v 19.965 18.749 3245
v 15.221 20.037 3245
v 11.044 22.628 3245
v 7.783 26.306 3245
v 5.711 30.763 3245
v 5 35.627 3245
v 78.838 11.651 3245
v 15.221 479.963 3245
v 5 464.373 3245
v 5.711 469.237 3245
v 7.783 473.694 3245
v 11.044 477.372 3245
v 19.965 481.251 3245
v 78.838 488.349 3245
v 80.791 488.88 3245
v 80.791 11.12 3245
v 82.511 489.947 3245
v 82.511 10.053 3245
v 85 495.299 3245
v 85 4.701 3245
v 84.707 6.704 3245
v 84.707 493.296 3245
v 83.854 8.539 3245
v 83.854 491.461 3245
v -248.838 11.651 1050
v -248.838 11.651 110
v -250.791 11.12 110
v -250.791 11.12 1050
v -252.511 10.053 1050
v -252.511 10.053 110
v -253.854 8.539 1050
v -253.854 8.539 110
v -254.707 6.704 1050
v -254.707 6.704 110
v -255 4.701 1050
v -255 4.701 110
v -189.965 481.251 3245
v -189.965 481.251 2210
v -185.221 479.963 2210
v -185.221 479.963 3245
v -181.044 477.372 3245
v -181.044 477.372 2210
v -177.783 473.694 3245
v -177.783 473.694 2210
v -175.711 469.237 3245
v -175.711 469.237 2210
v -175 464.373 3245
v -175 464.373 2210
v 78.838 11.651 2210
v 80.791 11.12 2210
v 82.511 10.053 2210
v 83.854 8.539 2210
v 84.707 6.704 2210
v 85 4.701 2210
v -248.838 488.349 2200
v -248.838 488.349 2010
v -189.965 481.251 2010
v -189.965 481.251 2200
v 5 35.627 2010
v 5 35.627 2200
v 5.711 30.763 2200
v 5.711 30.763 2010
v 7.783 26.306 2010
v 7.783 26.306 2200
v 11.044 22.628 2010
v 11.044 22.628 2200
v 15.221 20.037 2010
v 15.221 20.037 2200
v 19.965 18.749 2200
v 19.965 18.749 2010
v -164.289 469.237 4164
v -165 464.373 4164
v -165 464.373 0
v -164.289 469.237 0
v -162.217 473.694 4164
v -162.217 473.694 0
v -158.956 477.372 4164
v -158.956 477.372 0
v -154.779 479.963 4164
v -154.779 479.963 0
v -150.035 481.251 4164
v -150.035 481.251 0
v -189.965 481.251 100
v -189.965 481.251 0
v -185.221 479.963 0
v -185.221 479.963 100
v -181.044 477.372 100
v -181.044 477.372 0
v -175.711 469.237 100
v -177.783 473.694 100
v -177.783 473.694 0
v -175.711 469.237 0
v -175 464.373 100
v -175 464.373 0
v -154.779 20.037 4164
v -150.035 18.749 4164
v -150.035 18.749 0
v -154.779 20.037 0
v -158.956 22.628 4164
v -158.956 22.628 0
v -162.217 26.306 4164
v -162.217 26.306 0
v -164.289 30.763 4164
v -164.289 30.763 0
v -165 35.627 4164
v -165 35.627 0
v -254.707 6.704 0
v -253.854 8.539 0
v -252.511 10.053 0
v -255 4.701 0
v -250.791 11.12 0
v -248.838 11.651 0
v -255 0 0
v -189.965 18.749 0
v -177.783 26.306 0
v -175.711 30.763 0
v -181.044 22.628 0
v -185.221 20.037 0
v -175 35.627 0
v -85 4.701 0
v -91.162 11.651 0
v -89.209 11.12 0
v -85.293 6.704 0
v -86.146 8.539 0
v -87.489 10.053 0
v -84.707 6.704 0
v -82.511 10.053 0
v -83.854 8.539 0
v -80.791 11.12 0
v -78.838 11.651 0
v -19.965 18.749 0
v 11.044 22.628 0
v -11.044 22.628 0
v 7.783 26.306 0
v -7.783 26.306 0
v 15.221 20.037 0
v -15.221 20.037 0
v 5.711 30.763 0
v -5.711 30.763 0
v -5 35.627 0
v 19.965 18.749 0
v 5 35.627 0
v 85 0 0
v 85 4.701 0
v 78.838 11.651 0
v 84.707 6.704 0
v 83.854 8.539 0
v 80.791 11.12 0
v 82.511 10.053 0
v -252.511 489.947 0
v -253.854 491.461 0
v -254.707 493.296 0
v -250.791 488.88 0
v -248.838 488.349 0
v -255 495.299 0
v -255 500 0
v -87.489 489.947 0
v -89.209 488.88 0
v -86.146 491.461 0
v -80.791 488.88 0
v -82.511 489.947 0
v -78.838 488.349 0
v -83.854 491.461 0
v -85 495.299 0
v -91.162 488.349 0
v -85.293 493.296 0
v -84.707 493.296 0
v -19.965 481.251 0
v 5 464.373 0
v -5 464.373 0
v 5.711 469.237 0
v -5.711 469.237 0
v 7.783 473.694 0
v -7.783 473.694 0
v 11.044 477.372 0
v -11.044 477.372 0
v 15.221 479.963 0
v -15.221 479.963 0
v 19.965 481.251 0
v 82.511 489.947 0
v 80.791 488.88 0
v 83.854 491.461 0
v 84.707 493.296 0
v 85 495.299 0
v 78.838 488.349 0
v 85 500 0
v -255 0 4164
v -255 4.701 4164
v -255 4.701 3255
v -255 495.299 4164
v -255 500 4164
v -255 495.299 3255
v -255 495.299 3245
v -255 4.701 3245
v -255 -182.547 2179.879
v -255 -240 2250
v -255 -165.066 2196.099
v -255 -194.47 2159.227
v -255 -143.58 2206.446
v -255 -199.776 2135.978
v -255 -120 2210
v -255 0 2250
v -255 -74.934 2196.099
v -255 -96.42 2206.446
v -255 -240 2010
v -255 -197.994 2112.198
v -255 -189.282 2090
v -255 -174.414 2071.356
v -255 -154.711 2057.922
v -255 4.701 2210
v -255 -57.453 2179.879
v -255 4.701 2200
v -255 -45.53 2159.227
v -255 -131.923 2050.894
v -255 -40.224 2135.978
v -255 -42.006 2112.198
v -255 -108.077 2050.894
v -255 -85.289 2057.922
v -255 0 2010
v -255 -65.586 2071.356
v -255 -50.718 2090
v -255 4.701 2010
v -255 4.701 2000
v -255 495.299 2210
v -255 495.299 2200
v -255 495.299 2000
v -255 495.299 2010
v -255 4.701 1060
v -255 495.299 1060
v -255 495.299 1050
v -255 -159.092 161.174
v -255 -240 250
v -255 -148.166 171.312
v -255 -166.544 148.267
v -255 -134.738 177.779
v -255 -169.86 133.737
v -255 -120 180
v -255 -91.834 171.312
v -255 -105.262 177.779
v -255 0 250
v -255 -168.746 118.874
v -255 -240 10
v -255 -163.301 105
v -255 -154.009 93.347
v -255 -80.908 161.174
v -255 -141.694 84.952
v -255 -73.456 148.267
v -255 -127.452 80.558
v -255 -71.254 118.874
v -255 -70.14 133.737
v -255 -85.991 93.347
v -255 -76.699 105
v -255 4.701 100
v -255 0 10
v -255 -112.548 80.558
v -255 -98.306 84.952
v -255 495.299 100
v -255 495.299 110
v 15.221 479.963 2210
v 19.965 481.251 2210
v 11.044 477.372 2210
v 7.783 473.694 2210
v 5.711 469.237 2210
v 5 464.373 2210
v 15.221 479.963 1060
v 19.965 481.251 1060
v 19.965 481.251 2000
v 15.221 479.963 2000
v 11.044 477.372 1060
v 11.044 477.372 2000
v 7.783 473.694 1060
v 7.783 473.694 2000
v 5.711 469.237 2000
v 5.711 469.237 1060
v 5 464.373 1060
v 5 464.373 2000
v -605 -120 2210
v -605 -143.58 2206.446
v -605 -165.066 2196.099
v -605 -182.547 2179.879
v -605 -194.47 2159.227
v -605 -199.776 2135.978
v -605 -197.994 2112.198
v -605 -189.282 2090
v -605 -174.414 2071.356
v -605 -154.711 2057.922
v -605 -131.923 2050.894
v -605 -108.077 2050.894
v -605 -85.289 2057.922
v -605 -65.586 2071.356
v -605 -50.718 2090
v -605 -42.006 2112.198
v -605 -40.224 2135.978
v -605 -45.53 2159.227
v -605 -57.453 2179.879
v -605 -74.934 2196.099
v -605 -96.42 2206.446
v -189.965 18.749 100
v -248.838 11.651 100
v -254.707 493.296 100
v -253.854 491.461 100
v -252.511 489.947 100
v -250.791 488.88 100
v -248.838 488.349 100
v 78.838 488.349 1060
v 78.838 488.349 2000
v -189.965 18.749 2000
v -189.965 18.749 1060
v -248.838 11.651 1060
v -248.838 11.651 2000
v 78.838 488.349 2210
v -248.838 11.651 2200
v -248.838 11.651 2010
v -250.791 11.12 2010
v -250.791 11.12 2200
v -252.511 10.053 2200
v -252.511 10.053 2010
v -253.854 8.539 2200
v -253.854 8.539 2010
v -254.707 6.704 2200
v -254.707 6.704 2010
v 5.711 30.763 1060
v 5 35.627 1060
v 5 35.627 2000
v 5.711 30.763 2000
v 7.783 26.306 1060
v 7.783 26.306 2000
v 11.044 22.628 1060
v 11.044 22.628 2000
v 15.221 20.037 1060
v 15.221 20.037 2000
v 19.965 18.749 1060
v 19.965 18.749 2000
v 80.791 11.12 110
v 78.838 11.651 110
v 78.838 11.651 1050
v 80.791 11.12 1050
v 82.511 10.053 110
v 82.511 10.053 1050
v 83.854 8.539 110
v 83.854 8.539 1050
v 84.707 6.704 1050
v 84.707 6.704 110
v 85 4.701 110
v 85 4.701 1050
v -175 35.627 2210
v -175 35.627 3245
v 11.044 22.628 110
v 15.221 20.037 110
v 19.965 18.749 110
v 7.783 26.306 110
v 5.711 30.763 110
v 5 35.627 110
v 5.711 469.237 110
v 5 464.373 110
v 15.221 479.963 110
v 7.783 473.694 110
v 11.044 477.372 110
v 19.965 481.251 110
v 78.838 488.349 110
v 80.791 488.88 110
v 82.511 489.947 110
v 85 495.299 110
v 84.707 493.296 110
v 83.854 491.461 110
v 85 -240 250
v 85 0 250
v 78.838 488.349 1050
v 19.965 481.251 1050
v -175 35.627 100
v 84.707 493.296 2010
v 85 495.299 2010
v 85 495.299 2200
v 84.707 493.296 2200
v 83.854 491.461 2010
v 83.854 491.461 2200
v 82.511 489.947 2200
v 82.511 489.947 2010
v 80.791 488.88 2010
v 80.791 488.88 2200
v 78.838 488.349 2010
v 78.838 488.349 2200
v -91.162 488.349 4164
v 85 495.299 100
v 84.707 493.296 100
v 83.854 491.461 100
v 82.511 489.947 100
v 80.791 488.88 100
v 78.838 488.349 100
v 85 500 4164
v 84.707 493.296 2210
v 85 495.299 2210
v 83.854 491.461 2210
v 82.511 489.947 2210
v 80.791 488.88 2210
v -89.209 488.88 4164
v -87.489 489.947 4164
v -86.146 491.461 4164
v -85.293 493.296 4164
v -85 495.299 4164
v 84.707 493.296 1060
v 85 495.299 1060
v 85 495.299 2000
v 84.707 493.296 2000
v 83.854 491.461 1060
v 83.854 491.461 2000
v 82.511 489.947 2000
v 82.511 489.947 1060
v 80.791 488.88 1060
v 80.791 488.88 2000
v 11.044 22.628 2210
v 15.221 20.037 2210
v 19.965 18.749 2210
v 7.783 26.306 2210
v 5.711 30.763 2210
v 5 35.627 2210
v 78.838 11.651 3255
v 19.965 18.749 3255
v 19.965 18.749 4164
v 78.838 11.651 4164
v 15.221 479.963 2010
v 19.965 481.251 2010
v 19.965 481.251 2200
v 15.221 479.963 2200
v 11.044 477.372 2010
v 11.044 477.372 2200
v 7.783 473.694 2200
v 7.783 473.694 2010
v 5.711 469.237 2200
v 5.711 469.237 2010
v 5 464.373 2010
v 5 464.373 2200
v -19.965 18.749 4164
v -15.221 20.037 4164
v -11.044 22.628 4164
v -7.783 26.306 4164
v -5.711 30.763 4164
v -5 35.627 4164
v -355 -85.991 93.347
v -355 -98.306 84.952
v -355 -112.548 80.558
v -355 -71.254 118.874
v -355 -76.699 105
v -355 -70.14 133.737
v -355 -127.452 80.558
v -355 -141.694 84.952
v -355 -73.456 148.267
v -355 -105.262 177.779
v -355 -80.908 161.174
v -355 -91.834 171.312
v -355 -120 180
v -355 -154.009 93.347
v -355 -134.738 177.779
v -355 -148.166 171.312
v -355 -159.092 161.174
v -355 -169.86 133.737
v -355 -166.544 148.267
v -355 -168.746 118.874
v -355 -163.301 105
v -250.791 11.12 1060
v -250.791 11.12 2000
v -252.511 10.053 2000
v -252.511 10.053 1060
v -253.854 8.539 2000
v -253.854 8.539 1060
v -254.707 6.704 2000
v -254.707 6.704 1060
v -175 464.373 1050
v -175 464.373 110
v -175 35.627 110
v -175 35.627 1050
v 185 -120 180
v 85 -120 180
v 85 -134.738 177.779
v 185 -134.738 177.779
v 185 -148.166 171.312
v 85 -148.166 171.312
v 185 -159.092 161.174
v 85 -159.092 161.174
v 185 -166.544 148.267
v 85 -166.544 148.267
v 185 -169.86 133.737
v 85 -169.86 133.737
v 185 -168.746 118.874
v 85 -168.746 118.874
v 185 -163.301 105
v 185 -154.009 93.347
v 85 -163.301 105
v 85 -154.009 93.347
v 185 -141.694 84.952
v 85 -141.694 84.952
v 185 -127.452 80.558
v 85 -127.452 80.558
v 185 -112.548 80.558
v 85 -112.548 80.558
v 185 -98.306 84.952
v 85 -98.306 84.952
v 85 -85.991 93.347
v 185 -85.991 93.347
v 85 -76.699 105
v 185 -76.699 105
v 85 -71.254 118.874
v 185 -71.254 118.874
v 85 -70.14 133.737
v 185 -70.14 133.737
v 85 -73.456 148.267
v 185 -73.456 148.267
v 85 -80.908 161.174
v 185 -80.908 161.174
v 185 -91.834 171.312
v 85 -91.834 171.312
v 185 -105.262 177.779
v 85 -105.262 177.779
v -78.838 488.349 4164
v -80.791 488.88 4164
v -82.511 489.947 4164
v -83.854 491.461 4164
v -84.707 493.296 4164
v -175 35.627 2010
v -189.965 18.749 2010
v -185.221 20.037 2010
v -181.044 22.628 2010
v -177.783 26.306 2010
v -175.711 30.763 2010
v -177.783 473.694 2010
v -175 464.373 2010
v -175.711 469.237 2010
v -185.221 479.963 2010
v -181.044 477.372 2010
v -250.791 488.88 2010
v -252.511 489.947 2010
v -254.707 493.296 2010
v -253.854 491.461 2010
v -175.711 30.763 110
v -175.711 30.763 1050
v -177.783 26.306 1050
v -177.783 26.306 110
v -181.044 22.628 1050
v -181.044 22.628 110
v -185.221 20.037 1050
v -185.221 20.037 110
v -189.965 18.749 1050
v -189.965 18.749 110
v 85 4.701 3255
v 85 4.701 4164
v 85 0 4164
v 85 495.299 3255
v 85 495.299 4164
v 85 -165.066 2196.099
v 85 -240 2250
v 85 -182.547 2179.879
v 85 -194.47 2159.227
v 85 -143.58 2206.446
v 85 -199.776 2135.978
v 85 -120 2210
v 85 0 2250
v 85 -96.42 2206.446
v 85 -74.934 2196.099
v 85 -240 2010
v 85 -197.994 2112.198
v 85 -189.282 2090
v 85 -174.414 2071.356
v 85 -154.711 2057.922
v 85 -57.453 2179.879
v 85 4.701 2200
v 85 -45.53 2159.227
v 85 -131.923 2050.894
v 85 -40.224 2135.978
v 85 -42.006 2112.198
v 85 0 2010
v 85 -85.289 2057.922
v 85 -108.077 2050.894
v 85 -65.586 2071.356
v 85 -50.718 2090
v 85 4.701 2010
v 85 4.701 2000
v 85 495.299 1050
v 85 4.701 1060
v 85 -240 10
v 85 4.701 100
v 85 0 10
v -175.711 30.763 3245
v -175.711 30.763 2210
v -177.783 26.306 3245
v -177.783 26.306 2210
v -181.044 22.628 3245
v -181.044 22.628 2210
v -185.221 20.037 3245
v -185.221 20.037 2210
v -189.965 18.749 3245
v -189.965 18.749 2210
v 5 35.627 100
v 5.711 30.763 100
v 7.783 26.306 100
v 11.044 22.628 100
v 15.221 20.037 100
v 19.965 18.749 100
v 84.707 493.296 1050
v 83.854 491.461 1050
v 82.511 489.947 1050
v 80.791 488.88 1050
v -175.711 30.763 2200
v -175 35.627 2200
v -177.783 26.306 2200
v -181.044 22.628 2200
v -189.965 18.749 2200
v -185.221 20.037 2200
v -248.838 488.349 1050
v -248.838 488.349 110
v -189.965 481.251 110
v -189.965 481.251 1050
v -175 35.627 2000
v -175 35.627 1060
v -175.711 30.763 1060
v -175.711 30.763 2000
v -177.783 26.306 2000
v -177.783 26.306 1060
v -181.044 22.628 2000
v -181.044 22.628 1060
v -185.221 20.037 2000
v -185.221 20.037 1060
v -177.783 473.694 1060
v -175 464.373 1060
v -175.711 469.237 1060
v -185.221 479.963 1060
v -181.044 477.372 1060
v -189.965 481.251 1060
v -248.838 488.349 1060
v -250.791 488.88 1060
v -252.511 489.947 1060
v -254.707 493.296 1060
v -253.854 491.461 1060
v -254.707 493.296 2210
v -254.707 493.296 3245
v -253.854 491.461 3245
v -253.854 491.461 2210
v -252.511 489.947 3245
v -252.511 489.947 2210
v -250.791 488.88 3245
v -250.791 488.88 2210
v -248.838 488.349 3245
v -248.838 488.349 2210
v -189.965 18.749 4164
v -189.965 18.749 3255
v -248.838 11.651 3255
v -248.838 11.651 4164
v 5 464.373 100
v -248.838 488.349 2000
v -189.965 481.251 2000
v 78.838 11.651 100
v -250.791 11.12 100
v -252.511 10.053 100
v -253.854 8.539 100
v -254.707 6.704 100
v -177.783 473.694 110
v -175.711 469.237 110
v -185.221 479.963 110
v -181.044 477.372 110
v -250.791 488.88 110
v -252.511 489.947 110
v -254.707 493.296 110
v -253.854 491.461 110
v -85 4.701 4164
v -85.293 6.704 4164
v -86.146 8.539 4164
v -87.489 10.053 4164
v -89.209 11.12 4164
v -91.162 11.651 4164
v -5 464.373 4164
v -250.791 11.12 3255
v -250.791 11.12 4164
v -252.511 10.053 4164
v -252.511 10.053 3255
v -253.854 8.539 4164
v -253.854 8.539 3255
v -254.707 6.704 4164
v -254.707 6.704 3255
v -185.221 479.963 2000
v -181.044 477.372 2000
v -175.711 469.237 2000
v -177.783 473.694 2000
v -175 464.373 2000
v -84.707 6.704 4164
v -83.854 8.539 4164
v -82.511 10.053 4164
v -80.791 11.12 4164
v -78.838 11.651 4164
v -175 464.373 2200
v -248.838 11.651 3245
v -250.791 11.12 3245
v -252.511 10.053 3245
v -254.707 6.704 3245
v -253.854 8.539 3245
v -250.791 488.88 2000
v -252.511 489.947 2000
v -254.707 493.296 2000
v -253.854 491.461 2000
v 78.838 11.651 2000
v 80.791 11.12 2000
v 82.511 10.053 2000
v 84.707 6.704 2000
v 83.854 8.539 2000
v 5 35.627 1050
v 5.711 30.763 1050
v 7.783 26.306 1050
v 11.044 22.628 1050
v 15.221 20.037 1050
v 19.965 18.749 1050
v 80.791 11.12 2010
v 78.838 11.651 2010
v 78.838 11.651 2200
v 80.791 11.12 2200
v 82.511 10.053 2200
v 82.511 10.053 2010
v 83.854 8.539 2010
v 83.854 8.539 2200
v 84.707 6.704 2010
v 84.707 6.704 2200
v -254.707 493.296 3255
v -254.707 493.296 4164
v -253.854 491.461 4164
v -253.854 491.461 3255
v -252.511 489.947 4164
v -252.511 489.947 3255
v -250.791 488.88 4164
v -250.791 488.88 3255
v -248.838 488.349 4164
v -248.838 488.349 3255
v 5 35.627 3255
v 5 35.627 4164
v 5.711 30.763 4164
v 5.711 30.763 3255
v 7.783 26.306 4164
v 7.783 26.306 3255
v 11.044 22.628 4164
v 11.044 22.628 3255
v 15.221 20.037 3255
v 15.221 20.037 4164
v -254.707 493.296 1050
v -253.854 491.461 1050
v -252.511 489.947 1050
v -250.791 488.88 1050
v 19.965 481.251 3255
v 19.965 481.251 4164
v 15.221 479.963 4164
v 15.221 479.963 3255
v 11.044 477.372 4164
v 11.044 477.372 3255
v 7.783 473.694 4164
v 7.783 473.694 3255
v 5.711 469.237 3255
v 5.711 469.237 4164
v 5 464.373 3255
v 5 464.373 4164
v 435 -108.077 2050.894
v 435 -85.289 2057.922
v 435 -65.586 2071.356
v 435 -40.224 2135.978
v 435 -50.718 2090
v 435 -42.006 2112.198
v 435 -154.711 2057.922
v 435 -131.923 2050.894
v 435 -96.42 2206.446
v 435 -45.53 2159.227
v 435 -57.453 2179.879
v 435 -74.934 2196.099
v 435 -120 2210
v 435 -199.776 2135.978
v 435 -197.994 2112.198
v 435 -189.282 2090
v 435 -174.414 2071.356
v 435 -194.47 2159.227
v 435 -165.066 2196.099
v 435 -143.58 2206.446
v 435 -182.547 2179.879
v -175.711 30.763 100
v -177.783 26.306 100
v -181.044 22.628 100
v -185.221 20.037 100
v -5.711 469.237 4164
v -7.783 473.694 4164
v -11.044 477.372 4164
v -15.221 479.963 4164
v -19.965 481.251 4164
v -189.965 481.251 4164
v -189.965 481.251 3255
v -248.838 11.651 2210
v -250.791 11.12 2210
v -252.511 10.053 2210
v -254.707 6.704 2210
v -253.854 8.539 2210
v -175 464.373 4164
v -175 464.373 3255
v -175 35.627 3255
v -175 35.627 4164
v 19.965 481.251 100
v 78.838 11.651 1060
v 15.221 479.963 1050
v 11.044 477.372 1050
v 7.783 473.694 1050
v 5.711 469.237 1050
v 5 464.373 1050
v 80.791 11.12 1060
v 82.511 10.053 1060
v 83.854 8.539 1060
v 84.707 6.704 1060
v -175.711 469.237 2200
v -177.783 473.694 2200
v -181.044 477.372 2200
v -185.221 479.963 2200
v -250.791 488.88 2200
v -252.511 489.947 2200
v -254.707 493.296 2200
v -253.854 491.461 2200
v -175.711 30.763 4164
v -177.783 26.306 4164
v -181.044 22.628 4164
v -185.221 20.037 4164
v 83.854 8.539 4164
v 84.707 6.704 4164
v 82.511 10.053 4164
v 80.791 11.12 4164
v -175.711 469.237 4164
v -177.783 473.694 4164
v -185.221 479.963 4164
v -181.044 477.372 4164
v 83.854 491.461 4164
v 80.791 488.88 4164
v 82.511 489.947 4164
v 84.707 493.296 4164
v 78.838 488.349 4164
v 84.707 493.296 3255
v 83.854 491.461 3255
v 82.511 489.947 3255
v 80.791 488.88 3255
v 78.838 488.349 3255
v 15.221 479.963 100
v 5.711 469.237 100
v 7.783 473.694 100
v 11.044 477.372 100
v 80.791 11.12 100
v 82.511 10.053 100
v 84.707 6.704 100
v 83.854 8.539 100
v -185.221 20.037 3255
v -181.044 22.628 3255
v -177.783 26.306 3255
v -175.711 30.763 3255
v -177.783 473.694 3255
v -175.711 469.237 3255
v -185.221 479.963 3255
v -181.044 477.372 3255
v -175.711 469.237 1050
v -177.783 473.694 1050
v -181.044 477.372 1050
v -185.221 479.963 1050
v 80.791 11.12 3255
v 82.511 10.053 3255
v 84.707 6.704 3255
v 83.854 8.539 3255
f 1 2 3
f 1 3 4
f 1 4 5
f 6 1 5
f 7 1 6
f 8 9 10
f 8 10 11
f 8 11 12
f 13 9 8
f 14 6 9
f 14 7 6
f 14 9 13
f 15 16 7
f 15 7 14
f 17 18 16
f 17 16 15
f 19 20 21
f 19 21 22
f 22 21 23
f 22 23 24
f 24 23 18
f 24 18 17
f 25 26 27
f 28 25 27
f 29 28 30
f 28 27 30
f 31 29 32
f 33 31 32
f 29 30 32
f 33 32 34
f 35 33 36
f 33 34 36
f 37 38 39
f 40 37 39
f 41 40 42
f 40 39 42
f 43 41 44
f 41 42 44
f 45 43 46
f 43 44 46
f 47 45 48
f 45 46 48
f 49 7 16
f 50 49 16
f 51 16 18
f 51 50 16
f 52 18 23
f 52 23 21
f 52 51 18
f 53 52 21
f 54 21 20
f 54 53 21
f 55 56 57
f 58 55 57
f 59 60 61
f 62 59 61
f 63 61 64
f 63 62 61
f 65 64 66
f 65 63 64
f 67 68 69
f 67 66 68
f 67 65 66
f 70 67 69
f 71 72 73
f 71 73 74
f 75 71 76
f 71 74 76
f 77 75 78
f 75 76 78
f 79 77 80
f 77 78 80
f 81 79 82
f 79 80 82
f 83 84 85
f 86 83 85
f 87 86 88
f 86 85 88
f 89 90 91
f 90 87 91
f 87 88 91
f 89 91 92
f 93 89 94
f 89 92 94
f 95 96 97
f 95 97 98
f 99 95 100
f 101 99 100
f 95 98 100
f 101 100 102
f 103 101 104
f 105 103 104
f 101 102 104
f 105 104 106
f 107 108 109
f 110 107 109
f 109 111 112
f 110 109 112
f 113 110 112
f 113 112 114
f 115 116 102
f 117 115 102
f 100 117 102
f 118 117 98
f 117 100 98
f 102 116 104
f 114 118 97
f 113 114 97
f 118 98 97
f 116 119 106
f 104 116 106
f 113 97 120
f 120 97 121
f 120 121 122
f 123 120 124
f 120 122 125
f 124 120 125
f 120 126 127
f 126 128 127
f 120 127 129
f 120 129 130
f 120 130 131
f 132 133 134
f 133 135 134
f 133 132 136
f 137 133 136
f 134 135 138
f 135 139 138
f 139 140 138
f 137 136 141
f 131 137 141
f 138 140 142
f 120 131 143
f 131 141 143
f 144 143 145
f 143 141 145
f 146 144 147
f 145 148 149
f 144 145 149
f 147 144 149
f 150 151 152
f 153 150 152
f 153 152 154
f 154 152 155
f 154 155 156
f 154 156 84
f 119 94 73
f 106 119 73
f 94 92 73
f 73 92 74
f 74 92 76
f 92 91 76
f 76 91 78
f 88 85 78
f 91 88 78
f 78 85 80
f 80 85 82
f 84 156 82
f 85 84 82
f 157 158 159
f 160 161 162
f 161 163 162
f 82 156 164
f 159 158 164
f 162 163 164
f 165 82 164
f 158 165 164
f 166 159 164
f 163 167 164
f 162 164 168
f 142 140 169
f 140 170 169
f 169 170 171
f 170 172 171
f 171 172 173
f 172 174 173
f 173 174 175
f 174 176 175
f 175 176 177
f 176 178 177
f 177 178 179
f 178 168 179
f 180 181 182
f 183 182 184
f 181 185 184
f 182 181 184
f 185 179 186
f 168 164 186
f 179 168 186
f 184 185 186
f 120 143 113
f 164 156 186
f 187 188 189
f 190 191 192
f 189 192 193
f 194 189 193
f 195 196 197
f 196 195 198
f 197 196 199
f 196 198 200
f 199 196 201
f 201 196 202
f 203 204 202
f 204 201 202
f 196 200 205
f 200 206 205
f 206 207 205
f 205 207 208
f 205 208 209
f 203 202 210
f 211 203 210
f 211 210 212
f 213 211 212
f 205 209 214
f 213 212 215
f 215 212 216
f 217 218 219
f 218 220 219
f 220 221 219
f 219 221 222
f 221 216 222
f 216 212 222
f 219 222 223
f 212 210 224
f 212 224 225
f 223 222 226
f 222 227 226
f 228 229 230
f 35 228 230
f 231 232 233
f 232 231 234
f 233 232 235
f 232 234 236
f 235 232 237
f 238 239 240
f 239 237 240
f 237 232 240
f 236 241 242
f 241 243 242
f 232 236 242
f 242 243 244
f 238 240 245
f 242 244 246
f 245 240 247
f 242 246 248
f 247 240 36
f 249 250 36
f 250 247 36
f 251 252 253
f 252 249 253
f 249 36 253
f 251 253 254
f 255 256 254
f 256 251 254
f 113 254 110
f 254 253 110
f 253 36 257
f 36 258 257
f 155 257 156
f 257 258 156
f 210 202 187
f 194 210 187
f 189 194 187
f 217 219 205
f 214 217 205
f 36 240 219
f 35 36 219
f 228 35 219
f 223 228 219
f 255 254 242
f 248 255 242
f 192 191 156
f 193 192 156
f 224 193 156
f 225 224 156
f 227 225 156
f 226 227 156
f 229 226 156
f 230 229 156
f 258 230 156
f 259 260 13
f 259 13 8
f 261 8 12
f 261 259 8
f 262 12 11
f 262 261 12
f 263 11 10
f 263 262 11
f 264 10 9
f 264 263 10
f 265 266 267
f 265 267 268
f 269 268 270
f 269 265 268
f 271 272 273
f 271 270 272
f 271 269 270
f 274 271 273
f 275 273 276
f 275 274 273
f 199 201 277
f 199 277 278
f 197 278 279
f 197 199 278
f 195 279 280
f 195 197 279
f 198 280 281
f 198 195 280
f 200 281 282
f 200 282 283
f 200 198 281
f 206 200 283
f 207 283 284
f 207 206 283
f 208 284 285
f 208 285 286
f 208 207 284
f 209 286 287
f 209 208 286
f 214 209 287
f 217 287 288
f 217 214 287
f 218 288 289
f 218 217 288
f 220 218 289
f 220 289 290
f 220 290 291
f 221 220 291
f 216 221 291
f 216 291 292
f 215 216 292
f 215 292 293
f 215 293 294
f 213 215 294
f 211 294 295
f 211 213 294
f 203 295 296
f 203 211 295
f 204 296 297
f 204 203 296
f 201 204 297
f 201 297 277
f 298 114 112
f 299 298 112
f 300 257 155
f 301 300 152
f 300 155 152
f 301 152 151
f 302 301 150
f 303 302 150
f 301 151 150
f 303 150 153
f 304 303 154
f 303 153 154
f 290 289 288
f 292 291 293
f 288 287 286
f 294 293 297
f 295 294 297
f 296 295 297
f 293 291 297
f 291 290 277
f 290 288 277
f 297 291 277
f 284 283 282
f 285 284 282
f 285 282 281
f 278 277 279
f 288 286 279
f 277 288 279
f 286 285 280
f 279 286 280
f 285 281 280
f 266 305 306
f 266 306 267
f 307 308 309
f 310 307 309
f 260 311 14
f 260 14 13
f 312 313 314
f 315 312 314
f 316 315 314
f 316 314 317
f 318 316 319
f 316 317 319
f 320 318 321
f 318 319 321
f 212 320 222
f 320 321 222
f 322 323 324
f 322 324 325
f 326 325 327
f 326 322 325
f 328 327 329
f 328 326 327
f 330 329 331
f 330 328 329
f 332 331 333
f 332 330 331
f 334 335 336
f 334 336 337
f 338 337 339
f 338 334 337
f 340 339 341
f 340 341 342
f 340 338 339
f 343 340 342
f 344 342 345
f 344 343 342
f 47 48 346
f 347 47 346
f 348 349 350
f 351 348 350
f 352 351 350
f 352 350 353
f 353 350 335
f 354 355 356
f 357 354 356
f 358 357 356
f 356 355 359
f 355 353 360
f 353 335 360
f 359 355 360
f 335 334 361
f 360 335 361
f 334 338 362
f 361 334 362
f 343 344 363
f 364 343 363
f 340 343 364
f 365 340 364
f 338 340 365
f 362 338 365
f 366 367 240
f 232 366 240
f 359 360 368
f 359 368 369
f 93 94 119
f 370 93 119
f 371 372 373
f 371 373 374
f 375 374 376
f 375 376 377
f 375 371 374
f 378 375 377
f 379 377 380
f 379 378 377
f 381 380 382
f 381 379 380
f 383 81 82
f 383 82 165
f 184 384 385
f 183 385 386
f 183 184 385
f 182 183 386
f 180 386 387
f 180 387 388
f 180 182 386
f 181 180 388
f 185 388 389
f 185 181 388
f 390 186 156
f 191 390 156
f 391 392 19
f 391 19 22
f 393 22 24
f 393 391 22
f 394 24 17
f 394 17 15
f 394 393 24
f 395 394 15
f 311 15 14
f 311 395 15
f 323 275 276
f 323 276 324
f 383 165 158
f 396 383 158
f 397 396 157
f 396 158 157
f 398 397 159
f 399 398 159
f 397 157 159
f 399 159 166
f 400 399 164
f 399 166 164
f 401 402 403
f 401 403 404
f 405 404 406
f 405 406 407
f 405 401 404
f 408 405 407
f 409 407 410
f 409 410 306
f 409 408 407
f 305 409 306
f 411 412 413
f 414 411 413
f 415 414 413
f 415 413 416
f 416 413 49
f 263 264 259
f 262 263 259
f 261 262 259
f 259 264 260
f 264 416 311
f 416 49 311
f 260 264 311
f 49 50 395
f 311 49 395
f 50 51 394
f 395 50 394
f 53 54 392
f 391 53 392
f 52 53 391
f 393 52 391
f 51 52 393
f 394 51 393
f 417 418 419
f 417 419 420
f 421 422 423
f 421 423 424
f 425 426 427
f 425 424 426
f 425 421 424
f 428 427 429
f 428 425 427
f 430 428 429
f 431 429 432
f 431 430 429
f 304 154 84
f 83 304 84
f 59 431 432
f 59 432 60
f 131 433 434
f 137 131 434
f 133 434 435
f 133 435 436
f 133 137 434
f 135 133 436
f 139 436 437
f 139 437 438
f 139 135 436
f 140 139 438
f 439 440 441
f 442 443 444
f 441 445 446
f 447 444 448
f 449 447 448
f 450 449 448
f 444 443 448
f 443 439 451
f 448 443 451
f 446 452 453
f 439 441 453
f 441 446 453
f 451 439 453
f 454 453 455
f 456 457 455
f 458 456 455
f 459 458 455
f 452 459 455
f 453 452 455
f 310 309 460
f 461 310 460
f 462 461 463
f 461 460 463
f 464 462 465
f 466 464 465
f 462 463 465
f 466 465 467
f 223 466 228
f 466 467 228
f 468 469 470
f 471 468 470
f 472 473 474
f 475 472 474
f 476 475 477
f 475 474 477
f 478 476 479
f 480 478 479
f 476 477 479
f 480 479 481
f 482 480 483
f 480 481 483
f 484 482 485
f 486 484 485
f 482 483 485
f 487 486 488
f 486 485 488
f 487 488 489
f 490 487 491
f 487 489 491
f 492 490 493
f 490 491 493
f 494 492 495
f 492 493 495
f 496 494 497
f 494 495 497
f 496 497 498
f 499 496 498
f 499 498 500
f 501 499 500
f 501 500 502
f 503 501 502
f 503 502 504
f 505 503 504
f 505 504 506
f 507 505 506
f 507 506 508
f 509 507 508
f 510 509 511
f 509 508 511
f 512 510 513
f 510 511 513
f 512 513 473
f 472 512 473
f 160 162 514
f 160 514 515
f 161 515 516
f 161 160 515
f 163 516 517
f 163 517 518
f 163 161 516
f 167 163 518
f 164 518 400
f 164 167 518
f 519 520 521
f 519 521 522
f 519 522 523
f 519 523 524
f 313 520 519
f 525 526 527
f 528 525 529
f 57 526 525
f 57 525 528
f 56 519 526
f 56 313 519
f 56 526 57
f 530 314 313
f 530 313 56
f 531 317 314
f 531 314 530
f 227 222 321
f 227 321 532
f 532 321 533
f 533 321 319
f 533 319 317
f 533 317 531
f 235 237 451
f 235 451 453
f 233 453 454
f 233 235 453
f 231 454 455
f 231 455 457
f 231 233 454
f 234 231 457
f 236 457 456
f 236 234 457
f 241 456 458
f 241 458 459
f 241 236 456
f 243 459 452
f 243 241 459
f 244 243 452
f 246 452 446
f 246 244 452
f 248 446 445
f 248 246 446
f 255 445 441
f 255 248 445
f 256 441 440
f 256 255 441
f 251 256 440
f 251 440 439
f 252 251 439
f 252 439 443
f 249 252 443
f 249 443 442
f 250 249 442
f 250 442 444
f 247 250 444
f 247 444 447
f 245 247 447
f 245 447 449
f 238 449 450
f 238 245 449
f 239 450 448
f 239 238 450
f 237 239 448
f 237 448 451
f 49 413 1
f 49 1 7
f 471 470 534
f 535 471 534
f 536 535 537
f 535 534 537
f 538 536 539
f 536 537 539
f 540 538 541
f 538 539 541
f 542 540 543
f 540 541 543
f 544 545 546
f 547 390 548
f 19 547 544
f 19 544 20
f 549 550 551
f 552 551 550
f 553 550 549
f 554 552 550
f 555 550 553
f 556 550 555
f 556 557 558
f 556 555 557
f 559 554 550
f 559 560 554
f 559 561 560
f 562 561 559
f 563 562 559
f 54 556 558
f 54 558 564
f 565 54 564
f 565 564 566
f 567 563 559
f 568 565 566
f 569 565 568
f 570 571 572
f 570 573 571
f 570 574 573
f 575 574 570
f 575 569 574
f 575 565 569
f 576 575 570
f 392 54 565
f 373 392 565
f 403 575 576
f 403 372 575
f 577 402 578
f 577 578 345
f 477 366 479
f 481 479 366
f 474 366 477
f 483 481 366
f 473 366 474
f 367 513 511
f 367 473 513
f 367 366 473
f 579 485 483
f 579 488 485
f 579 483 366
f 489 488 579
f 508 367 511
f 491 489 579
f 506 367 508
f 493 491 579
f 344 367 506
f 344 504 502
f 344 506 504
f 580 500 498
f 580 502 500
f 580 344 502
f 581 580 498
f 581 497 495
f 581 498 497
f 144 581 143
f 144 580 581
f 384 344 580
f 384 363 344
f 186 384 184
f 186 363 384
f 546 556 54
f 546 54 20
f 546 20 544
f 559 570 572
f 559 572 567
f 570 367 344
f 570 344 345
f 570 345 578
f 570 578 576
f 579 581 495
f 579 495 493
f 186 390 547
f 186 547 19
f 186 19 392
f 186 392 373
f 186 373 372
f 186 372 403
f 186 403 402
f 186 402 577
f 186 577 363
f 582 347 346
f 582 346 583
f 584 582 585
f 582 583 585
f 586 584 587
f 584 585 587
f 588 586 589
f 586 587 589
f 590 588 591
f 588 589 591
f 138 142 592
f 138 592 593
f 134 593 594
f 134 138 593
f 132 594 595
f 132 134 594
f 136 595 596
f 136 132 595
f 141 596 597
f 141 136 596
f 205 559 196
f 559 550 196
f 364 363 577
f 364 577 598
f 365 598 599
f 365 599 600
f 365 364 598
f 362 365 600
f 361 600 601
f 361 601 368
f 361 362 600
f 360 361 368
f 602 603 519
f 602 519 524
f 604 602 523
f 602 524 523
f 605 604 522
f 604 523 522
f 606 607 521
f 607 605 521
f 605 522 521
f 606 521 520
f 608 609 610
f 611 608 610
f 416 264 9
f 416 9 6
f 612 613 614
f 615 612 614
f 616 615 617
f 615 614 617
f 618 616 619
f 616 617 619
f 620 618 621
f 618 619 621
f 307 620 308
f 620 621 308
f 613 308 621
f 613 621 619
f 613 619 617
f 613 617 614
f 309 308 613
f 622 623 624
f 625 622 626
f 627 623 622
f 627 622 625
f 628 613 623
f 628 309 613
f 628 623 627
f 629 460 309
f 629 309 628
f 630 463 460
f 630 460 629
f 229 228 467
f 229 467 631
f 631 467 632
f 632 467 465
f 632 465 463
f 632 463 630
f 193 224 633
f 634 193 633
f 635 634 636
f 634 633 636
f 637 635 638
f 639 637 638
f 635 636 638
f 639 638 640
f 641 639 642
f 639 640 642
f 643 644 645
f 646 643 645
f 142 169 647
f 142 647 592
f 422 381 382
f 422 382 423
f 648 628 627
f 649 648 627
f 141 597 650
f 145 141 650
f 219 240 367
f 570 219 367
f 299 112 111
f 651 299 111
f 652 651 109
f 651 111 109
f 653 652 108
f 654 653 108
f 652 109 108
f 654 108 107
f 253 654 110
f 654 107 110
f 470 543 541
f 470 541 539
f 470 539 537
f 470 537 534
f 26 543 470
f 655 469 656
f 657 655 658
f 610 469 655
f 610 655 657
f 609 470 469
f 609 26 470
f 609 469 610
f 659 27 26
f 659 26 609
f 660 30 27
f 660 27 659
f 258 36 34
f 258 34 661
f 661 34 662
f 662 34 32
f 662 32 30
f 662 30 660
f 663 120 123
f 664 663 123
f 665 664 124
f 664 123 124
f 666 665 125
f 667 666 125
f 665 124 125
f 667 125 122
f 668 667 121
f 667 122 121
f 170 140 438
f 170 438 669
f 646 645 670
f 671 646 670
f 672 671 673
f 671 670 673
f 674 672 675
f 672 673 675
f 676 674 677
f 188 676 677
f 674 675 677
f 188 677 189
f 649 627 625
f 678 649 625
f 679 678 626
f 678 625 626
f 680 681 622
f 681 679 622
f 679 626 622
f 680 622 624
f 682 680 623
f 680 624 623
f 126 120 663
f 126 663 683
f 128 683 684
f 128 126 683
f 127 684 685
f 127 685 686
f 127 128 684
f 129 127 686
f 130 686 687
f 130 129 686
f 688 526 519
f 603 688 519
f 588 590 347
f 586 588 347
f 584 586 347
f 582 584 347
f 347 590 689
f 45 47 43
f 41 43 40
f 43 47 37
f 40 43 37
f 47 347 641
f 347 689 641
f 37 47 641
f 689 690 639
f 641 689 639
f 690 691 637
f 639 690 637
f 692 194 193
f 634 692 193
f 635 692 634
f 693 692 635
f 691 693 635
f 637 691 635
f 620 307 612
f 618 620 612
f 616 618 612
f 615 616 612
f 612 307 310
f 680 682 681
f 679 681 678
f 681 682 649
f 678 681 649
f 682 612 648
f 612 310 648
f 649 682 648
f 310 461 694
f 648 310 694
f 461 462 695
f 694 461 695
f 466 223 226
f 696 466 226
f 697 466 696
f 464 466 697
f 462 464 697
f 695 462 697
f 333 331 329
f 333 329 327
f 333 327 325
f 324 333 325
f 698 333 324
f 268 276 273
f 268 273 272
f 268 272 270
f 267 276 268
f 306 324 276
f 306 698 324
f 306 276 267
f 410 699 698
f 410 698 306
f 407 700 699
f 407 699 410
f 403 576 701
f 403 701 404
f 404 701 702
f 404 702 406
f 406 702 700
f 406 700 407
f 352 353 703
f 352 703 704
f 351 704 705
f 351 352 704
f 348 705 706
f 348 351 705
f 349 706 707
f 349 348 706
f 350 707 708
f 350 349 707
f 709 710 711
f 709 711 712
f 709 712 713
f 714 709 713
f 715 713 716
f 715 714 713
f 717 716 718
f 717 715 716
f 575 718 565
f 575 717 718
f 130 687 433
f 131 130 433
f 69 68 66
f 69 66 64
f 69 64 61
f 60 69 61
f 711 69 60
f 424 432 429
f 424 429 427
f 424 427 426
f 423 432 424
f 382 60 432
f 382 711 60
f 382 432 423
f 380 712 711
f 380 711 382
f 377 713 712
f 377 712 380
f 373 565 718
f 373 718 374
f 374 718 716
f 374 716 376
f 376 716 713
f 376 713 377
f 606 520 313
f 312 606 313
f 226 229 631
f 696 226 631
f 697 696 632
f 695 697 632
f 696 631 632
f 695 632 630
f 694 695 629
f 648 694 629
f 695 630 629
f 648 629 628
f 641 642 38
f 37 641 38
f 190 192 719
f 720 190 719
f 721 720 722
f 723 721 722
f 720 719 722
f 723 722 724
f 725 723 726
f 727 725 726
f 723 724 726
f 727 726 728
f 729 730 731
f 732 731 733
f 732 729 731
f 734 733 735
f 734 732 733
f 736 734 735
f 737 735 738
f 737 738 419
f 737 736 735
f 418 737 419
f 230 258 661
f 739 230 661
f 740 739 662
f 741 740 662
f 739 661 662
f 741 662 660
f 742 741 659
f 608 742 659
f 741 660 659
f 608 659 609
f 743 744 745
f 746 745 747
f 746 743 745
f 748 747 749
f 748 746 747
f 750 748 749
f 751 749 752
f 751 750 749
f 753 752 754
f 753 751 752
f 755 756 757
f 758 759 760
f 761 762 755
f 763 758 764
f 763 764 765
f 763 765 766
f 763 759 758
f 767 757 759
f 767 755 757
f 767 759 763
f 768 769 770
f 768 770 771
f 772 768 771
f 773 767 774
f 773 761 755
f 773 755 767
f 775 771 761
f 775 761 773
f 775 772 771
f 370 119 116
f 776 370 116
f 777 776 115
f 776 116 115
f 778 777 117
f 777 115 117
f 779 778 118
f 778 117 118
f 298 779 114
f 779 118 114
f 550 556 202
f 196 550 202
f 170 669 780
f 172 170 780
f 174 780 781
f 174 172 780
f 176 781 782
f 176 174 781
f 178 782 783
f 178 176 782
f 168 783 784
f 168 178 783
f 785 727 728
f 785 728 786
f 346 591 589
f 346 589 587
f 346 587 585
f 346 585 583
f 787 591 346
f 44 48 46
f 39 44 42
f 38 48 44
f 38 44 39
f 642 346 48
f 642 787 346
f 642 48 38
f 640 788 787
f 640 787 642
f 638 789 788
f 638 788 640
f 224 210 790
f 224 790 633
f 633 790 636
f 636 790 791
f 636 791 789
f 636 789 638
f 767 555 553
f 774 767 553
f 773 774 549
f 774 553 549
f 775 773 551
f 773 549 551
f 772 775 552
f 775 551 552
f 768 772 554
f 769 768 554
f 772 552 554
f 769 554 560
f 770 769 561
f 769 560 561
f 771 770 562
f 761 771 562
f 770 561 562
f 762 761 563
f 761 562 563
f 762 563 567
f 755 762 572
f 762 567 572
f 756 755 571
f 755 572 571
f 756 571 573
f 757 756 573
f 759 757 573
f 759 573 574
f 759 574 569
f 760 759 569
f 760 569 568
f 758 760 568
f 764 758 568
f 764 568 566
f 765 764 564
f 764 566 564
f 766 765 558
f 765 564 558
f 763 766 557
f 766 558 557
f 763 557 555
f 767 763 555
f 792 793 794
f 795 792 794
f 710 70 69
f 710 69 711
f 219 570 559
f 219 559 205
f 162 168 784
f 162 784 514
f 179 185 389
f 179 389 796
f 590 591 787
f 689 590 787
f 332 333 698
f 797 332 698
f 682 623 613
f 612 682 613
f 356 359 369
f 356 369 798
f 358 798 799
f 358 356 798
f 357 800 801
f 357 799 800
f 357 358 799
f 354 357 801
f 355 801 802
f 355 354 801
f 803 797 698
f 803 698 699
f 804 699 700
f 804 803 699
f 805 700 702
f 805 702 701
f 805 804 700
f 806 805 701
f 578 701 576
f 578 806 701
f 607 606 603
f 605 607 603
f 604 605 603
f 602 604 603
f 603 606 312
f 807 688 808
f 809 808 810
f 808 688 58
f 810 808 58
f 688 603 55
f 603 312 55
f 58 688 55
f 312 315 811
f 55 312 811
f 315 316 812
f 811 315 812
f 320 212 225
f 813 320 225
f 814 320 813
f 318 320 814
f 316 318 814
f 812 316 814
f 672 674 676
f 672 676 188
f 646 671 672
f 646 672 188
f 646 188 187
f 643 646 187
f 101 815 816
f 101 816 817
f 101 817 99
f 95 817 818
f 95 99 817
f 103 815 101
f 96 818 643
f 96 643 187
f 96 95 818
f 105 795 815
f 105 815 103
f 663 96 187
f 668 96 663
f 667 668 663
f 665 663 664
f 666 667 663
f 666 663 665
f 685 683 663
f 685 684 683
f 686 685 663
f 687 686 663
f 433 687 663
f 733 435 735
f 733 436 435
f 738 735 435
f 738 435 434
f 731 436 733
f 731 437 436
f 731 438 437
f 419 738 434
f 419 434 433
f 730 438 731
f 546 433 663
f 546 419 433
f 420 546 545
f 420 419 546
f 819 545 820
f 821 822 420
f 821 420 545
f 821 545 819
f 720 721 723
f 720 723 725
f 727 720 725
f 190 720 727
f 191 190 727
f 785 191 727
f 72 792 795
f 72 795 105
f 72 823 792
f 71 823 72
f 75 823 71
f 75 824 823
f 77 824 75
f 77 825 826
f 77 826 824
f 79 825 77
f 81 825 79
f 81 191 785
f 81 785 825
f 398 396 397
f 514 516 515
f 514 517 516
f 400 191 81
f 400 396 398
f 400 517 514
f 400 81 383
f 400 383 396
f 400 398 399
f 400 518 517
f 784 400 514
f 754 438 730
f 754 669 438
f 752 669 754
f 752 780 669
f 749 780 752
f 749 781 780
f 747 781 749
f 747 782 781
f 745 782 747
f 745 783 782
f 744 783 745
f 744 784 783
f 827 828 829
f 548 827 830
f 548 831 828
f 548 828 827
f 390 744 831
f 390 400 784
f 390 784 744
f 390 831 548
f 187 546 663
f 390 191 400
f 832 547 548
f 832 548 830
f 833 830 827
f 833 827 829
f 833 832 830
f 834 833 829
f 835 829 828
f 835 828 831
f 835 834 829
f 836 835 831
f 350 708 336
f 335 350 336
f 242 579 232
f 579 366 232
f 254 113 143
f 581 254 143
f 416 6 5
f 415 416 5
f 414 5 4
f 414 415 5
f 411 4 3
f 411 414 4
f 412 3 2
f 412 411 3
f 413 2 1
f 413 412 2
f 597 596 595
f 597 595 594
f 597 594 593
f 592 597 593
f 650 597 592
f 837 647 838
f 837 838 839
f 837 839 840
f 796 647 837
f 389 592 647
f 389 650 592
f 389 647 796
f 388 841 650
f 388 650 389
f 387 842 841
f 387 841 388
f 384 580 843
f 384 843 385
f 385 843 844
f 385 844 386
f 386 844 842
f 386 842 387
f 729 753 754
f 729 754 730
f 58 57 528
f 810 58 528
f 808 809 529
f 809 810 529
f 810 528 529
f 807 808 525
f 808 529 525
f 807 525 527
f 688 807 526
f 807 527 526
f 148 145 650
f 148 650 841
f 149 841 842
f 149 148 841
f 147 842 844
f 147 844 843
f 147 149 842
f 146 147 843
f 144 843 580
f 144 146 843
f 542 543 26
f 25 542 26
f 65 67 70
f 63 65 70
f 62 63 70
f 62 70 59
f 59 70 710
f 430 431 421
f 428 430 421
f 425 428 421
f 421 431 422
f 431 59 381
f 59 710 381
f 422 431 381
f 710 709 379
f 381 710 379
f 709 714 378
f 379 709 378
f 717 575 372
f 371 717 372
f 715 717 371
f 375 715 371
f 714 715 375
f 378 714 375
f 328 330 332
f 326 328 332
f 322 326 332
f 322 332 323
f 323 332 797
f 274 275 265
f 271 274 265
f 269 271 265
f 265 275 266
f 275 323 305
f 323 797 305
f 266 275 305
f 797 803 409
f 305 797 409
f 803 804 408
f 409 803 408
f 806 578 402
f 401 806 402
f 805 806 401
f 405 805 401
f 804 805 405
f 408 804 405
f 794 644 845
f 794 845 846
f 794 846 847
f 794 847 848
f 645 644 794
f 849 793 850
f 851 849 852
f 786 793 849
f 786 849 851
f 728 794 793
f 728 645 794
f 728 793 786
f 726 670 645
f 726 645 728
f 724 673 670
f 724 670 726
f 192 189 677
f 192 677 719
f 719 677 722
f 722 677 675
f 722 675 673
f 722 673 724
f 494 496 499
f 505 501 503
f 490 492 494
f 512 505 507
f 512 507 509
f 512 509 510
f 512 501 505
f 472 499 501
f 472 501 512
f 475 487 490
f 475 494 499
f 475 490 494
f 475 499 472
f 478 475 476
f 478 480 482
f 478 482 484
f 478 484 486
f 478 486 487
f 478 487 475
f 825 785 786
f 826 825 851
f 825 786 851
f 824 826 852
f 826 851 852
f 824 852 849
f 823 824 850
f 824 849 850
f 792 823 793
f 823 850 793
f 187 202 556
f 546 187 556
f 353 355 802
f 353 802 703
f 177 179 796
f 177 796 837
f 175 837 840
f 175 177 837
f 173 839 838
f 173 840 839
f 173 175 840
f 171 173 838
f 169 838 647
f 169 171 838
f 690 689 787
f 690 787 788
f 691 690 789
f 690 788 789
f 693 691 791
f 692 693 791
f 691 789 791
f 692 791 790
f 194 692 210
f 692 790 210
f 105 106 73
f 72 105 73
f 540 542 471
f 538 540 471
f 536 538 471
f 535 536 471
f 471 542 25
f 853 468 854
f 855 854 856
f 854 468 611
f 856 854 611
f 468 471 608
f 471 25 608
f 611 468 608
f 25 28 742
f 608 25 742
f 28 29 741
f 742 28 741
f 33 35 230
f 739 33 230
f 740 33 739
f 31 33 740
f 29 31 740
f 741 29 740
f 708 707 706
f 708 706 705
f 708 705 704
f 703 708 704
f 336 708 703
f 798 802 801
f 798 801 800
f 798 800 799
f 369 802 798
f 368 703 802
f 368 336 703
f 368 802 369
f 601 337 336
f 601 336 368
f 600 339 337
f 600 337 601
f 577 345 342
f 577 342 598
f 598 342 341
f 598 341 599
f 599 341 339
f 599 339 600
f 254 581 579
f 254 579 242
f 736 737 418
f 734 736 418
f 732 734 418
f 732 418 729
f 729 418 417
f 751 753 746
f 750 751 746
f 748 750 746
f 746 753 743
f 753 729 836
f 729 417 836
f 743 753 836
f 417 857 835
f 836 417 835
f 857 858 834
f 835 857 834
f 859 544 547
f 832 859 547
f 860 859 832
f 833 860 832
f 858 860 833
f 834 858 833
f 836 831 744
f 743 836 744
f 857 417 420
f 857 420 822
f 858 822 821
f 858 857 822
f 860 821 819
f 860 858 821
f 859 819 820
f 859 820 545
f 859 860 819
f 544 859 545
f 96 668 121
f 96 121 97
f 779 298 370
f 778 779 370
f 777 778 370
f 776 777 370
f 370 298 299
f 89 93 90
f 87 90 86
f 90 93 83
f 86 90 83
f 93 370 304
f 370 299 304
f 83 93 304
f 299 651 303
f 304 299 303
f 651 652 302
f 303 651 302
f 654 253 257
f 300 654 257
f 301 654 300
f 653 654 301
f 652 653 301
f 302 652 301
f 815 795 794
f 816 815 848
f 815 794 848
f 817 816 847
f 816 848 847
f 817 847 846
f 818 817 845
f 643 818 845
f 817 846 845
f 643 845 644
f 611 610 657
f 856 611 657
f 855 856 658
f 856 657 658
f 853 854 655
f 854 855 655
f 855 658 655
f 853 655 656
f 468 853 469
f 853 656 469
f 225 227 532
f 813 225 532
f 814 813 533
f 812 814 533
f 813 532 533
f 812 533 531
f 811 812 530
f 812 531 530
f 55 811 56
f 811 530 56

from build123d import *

# Parameters (mm, degrees)
EXTRUDE_1136_DEPTH     = 4164
EXTRUDE_1_REACH        = 4199.356
SKETCH_1191_W          = 10
SKETCH_1191_H          = 490.598199432
PATTERN_LINEAR_1_COUNT = 3
PATTERN_LINEAR_1_PITCH = 950
PATTERN_LINEAR_2_COUNT = 2
PATTERN_LINEAR_2_PITCH = 2100
PATTERN_LINEAR_3_COUNT = 2
PATTERN_LINEAR_3_PITCH = 3145
SKETCH_1597_W          = 170
SKETCH_1597_H          = 240
EXTRUDE_1746_DEPTH     = 240
SKETCH_1801_R          = 80
EXTRUDE_2316_DEPTH     = 350
SKETCH_2358_W          = 170
SKETCH_2358_H          = 240
EXTRUDE_2517_DEPTH     = 240
SKETCH_2569_R          = 50
EXTRUDE_3116_DEPTH     = 100


# Read off the part's stored shape, not the designer's step: Дзеркальне відображення
with BuildPart() as part:
    # Sketch 696 → Extrude 1136 (new body)
    with BuildSketch(Plane.XY):
        with BuildLine():
            Line((5, 464.372813925), (5, 35.627186075))
            ThreePointArc((5, 35.627186075), (9.279999452, 24.348818017), (19.964892476, 18.749439265))
            Line((19.964892476, 18.749439265), (78.837985451, 11.650560735))
            ThreePointArc((78.837985451, 11.650560735), (83.237647285, 9.34493419), (85, 4.700900284))
            Line((85, 4.700900284), (85, 0))
            Line((85, 0), (-85, 0))
            Line((-85, 0), (-85, 4.700900284))
            ThreePointArc((-85, 4.700900284), (-83.237647285, 9.34493419), (-78.837985451, 11.650560735))
            Line((-78.837985451, 11.650560735), (-19.964892476, 18.749439265))
            ThreePointArc((-19.964892476, 18.749439265), (-9.279999452, 24.348818017), (-5, 35.627186075))
            Line((-5, 35.627186075), (-5, 464.372813925))
            ThreePointArc((-5, 464.372813925), (-9.279999452, 475.651181983), (-19.964892476, 481.250560735))
            Line((-19.964892476, 481.250560735), (-78.837985451, 488.349439265))
            ThreePointArc((-78.837985451, 488.349439265), (-83.237647285, 490.65506581), (-85, 495.299099716))
            Line((-85, 495.299099716), (-85, 500))
            Line((-85, 500), (85, 500))
            Line((85, 500), (85, 495.299099716))
            ThreePointArc((85, 495.299099716), (83.237647285, 490.65506581), (78.837985451, 488.349439265))
            Line((78.837985451, 488.349439265), (19.964892476, 481.250560735))
            ThreePointArc((19.964892476, 481.250560735), (9.279999452, 475.651181983), (5, 464.372813925))
        make_face()
    extrude(amount=EXTRUDE_1136_DEPTH)

    # Ребро1: up to this face of the body (flat: up to its plane)
    extrude_1_end = Plane(part.part.faces().sort_by_distance((5, 250, 2082))[0])
    # Sketch 1191 → Ребро1 (add, up to the picked face)
    with BuildSketch(Plane(origin=(85, 0, 0), x_dir=(0, 0, -1), z_dir=(1, 0, 0)), mode=Mode.PRIVATE) as extrude_1_sk1:
        with Locations((-105, 250)):
            Rectangle(SKETCH_1191_W, SKETCH_1191_H)
    extrude_1_tool1 = split(extrude(extrude_1_sk1.sketch, amount=-EXTRUDE_1_REACH, mode=Mode.PRIVATE), bisect_by=extrude_1_end, keep=Keep.BOTH, mode=Mode.PRIVATE)
    extrude_1 = extrude_1_tool1.solids().sort_by(Axis((85, 250, 105), (-1, 0, 0)))[0]
    add(extrude_1)

    # Масив ребер1: Ребро1 ×3
    with Locations(*[(0, 0, i * PATTERN_LINEAR_1_PITCH) for i in range(1, PATTERN_LINEAR_1_COUNT)]):
        add(extrude_1)

    # Масив ребер2: Ребро1 ×2
    with Locations(*[(0, 0, i * PATTERN_LINEAR_2_PITCH) for i in range(1, PATTERN_LINEAR_2_COUNT)]):
        add(extrude_1)

    # Масив ребер3: Ребро1 ×2
    with Locations(*[(0, 0, i * PATTERN_LINEAR_3_PITCH) for i in range(1, PATTERN_LINEAR_3_COUNT)]):
        add(extrude_1)

    # Sketch 1597 → Extrude 1746 (add)
    with BuildSketch(Plane.XZ):
        with Locations((0, 2130)):
            Rectangle(SKETCH_1597_W, SKETCH_1597_H)
    extrude(amount=EXTRUDE_1746_DEPTH)

    # Sketch 1801 → Extrude 2316 (add)
    with BuildSketch(Plane(origin=(85, 0, 0), x_dir=(0, 0, -1), z_dir=(1, 0, 0))):
        with Locations(Location((-2130, -120, 0), (0, 0, 180))):
            Circle(SKETCH_1801_R)
    extrude(amount=EXTRUDE_2316_DEPTH)

    # Sketch 2358 → Extrude 2517 (add)
    with BuildSketch(Plane.XZ):
        with Locations((0, 130)):
            Rectangle(SKETCH_2358_W, SKETCH_2358_H)
    extrude(amount=EXTRUDE_2517_DEPTH)

    # Sketch 2569 → Extrude 3116 (add)
    with BuildSketch(Plane(origin=(85, 0, 0), x_dir=(0, 0, -1), z_dir=(1, 0, 0))):
        with Locations(Location((-130, -120, 0), (0, 0, 180))):
            Circle(SKETCH_2569_R)
    extrude(amount=EXTRUDE_3116_DEPTH)

    # Mirror 3159: part across plane


with BuildPart() as part_1:
    add(part.part)
    add(part.part.mirror(Plane(origin=(-85, 4.700900284, 4164), x_dir=(0, 0, 1), z_dir=(1, 0, 0))))


solid = part_1.part
